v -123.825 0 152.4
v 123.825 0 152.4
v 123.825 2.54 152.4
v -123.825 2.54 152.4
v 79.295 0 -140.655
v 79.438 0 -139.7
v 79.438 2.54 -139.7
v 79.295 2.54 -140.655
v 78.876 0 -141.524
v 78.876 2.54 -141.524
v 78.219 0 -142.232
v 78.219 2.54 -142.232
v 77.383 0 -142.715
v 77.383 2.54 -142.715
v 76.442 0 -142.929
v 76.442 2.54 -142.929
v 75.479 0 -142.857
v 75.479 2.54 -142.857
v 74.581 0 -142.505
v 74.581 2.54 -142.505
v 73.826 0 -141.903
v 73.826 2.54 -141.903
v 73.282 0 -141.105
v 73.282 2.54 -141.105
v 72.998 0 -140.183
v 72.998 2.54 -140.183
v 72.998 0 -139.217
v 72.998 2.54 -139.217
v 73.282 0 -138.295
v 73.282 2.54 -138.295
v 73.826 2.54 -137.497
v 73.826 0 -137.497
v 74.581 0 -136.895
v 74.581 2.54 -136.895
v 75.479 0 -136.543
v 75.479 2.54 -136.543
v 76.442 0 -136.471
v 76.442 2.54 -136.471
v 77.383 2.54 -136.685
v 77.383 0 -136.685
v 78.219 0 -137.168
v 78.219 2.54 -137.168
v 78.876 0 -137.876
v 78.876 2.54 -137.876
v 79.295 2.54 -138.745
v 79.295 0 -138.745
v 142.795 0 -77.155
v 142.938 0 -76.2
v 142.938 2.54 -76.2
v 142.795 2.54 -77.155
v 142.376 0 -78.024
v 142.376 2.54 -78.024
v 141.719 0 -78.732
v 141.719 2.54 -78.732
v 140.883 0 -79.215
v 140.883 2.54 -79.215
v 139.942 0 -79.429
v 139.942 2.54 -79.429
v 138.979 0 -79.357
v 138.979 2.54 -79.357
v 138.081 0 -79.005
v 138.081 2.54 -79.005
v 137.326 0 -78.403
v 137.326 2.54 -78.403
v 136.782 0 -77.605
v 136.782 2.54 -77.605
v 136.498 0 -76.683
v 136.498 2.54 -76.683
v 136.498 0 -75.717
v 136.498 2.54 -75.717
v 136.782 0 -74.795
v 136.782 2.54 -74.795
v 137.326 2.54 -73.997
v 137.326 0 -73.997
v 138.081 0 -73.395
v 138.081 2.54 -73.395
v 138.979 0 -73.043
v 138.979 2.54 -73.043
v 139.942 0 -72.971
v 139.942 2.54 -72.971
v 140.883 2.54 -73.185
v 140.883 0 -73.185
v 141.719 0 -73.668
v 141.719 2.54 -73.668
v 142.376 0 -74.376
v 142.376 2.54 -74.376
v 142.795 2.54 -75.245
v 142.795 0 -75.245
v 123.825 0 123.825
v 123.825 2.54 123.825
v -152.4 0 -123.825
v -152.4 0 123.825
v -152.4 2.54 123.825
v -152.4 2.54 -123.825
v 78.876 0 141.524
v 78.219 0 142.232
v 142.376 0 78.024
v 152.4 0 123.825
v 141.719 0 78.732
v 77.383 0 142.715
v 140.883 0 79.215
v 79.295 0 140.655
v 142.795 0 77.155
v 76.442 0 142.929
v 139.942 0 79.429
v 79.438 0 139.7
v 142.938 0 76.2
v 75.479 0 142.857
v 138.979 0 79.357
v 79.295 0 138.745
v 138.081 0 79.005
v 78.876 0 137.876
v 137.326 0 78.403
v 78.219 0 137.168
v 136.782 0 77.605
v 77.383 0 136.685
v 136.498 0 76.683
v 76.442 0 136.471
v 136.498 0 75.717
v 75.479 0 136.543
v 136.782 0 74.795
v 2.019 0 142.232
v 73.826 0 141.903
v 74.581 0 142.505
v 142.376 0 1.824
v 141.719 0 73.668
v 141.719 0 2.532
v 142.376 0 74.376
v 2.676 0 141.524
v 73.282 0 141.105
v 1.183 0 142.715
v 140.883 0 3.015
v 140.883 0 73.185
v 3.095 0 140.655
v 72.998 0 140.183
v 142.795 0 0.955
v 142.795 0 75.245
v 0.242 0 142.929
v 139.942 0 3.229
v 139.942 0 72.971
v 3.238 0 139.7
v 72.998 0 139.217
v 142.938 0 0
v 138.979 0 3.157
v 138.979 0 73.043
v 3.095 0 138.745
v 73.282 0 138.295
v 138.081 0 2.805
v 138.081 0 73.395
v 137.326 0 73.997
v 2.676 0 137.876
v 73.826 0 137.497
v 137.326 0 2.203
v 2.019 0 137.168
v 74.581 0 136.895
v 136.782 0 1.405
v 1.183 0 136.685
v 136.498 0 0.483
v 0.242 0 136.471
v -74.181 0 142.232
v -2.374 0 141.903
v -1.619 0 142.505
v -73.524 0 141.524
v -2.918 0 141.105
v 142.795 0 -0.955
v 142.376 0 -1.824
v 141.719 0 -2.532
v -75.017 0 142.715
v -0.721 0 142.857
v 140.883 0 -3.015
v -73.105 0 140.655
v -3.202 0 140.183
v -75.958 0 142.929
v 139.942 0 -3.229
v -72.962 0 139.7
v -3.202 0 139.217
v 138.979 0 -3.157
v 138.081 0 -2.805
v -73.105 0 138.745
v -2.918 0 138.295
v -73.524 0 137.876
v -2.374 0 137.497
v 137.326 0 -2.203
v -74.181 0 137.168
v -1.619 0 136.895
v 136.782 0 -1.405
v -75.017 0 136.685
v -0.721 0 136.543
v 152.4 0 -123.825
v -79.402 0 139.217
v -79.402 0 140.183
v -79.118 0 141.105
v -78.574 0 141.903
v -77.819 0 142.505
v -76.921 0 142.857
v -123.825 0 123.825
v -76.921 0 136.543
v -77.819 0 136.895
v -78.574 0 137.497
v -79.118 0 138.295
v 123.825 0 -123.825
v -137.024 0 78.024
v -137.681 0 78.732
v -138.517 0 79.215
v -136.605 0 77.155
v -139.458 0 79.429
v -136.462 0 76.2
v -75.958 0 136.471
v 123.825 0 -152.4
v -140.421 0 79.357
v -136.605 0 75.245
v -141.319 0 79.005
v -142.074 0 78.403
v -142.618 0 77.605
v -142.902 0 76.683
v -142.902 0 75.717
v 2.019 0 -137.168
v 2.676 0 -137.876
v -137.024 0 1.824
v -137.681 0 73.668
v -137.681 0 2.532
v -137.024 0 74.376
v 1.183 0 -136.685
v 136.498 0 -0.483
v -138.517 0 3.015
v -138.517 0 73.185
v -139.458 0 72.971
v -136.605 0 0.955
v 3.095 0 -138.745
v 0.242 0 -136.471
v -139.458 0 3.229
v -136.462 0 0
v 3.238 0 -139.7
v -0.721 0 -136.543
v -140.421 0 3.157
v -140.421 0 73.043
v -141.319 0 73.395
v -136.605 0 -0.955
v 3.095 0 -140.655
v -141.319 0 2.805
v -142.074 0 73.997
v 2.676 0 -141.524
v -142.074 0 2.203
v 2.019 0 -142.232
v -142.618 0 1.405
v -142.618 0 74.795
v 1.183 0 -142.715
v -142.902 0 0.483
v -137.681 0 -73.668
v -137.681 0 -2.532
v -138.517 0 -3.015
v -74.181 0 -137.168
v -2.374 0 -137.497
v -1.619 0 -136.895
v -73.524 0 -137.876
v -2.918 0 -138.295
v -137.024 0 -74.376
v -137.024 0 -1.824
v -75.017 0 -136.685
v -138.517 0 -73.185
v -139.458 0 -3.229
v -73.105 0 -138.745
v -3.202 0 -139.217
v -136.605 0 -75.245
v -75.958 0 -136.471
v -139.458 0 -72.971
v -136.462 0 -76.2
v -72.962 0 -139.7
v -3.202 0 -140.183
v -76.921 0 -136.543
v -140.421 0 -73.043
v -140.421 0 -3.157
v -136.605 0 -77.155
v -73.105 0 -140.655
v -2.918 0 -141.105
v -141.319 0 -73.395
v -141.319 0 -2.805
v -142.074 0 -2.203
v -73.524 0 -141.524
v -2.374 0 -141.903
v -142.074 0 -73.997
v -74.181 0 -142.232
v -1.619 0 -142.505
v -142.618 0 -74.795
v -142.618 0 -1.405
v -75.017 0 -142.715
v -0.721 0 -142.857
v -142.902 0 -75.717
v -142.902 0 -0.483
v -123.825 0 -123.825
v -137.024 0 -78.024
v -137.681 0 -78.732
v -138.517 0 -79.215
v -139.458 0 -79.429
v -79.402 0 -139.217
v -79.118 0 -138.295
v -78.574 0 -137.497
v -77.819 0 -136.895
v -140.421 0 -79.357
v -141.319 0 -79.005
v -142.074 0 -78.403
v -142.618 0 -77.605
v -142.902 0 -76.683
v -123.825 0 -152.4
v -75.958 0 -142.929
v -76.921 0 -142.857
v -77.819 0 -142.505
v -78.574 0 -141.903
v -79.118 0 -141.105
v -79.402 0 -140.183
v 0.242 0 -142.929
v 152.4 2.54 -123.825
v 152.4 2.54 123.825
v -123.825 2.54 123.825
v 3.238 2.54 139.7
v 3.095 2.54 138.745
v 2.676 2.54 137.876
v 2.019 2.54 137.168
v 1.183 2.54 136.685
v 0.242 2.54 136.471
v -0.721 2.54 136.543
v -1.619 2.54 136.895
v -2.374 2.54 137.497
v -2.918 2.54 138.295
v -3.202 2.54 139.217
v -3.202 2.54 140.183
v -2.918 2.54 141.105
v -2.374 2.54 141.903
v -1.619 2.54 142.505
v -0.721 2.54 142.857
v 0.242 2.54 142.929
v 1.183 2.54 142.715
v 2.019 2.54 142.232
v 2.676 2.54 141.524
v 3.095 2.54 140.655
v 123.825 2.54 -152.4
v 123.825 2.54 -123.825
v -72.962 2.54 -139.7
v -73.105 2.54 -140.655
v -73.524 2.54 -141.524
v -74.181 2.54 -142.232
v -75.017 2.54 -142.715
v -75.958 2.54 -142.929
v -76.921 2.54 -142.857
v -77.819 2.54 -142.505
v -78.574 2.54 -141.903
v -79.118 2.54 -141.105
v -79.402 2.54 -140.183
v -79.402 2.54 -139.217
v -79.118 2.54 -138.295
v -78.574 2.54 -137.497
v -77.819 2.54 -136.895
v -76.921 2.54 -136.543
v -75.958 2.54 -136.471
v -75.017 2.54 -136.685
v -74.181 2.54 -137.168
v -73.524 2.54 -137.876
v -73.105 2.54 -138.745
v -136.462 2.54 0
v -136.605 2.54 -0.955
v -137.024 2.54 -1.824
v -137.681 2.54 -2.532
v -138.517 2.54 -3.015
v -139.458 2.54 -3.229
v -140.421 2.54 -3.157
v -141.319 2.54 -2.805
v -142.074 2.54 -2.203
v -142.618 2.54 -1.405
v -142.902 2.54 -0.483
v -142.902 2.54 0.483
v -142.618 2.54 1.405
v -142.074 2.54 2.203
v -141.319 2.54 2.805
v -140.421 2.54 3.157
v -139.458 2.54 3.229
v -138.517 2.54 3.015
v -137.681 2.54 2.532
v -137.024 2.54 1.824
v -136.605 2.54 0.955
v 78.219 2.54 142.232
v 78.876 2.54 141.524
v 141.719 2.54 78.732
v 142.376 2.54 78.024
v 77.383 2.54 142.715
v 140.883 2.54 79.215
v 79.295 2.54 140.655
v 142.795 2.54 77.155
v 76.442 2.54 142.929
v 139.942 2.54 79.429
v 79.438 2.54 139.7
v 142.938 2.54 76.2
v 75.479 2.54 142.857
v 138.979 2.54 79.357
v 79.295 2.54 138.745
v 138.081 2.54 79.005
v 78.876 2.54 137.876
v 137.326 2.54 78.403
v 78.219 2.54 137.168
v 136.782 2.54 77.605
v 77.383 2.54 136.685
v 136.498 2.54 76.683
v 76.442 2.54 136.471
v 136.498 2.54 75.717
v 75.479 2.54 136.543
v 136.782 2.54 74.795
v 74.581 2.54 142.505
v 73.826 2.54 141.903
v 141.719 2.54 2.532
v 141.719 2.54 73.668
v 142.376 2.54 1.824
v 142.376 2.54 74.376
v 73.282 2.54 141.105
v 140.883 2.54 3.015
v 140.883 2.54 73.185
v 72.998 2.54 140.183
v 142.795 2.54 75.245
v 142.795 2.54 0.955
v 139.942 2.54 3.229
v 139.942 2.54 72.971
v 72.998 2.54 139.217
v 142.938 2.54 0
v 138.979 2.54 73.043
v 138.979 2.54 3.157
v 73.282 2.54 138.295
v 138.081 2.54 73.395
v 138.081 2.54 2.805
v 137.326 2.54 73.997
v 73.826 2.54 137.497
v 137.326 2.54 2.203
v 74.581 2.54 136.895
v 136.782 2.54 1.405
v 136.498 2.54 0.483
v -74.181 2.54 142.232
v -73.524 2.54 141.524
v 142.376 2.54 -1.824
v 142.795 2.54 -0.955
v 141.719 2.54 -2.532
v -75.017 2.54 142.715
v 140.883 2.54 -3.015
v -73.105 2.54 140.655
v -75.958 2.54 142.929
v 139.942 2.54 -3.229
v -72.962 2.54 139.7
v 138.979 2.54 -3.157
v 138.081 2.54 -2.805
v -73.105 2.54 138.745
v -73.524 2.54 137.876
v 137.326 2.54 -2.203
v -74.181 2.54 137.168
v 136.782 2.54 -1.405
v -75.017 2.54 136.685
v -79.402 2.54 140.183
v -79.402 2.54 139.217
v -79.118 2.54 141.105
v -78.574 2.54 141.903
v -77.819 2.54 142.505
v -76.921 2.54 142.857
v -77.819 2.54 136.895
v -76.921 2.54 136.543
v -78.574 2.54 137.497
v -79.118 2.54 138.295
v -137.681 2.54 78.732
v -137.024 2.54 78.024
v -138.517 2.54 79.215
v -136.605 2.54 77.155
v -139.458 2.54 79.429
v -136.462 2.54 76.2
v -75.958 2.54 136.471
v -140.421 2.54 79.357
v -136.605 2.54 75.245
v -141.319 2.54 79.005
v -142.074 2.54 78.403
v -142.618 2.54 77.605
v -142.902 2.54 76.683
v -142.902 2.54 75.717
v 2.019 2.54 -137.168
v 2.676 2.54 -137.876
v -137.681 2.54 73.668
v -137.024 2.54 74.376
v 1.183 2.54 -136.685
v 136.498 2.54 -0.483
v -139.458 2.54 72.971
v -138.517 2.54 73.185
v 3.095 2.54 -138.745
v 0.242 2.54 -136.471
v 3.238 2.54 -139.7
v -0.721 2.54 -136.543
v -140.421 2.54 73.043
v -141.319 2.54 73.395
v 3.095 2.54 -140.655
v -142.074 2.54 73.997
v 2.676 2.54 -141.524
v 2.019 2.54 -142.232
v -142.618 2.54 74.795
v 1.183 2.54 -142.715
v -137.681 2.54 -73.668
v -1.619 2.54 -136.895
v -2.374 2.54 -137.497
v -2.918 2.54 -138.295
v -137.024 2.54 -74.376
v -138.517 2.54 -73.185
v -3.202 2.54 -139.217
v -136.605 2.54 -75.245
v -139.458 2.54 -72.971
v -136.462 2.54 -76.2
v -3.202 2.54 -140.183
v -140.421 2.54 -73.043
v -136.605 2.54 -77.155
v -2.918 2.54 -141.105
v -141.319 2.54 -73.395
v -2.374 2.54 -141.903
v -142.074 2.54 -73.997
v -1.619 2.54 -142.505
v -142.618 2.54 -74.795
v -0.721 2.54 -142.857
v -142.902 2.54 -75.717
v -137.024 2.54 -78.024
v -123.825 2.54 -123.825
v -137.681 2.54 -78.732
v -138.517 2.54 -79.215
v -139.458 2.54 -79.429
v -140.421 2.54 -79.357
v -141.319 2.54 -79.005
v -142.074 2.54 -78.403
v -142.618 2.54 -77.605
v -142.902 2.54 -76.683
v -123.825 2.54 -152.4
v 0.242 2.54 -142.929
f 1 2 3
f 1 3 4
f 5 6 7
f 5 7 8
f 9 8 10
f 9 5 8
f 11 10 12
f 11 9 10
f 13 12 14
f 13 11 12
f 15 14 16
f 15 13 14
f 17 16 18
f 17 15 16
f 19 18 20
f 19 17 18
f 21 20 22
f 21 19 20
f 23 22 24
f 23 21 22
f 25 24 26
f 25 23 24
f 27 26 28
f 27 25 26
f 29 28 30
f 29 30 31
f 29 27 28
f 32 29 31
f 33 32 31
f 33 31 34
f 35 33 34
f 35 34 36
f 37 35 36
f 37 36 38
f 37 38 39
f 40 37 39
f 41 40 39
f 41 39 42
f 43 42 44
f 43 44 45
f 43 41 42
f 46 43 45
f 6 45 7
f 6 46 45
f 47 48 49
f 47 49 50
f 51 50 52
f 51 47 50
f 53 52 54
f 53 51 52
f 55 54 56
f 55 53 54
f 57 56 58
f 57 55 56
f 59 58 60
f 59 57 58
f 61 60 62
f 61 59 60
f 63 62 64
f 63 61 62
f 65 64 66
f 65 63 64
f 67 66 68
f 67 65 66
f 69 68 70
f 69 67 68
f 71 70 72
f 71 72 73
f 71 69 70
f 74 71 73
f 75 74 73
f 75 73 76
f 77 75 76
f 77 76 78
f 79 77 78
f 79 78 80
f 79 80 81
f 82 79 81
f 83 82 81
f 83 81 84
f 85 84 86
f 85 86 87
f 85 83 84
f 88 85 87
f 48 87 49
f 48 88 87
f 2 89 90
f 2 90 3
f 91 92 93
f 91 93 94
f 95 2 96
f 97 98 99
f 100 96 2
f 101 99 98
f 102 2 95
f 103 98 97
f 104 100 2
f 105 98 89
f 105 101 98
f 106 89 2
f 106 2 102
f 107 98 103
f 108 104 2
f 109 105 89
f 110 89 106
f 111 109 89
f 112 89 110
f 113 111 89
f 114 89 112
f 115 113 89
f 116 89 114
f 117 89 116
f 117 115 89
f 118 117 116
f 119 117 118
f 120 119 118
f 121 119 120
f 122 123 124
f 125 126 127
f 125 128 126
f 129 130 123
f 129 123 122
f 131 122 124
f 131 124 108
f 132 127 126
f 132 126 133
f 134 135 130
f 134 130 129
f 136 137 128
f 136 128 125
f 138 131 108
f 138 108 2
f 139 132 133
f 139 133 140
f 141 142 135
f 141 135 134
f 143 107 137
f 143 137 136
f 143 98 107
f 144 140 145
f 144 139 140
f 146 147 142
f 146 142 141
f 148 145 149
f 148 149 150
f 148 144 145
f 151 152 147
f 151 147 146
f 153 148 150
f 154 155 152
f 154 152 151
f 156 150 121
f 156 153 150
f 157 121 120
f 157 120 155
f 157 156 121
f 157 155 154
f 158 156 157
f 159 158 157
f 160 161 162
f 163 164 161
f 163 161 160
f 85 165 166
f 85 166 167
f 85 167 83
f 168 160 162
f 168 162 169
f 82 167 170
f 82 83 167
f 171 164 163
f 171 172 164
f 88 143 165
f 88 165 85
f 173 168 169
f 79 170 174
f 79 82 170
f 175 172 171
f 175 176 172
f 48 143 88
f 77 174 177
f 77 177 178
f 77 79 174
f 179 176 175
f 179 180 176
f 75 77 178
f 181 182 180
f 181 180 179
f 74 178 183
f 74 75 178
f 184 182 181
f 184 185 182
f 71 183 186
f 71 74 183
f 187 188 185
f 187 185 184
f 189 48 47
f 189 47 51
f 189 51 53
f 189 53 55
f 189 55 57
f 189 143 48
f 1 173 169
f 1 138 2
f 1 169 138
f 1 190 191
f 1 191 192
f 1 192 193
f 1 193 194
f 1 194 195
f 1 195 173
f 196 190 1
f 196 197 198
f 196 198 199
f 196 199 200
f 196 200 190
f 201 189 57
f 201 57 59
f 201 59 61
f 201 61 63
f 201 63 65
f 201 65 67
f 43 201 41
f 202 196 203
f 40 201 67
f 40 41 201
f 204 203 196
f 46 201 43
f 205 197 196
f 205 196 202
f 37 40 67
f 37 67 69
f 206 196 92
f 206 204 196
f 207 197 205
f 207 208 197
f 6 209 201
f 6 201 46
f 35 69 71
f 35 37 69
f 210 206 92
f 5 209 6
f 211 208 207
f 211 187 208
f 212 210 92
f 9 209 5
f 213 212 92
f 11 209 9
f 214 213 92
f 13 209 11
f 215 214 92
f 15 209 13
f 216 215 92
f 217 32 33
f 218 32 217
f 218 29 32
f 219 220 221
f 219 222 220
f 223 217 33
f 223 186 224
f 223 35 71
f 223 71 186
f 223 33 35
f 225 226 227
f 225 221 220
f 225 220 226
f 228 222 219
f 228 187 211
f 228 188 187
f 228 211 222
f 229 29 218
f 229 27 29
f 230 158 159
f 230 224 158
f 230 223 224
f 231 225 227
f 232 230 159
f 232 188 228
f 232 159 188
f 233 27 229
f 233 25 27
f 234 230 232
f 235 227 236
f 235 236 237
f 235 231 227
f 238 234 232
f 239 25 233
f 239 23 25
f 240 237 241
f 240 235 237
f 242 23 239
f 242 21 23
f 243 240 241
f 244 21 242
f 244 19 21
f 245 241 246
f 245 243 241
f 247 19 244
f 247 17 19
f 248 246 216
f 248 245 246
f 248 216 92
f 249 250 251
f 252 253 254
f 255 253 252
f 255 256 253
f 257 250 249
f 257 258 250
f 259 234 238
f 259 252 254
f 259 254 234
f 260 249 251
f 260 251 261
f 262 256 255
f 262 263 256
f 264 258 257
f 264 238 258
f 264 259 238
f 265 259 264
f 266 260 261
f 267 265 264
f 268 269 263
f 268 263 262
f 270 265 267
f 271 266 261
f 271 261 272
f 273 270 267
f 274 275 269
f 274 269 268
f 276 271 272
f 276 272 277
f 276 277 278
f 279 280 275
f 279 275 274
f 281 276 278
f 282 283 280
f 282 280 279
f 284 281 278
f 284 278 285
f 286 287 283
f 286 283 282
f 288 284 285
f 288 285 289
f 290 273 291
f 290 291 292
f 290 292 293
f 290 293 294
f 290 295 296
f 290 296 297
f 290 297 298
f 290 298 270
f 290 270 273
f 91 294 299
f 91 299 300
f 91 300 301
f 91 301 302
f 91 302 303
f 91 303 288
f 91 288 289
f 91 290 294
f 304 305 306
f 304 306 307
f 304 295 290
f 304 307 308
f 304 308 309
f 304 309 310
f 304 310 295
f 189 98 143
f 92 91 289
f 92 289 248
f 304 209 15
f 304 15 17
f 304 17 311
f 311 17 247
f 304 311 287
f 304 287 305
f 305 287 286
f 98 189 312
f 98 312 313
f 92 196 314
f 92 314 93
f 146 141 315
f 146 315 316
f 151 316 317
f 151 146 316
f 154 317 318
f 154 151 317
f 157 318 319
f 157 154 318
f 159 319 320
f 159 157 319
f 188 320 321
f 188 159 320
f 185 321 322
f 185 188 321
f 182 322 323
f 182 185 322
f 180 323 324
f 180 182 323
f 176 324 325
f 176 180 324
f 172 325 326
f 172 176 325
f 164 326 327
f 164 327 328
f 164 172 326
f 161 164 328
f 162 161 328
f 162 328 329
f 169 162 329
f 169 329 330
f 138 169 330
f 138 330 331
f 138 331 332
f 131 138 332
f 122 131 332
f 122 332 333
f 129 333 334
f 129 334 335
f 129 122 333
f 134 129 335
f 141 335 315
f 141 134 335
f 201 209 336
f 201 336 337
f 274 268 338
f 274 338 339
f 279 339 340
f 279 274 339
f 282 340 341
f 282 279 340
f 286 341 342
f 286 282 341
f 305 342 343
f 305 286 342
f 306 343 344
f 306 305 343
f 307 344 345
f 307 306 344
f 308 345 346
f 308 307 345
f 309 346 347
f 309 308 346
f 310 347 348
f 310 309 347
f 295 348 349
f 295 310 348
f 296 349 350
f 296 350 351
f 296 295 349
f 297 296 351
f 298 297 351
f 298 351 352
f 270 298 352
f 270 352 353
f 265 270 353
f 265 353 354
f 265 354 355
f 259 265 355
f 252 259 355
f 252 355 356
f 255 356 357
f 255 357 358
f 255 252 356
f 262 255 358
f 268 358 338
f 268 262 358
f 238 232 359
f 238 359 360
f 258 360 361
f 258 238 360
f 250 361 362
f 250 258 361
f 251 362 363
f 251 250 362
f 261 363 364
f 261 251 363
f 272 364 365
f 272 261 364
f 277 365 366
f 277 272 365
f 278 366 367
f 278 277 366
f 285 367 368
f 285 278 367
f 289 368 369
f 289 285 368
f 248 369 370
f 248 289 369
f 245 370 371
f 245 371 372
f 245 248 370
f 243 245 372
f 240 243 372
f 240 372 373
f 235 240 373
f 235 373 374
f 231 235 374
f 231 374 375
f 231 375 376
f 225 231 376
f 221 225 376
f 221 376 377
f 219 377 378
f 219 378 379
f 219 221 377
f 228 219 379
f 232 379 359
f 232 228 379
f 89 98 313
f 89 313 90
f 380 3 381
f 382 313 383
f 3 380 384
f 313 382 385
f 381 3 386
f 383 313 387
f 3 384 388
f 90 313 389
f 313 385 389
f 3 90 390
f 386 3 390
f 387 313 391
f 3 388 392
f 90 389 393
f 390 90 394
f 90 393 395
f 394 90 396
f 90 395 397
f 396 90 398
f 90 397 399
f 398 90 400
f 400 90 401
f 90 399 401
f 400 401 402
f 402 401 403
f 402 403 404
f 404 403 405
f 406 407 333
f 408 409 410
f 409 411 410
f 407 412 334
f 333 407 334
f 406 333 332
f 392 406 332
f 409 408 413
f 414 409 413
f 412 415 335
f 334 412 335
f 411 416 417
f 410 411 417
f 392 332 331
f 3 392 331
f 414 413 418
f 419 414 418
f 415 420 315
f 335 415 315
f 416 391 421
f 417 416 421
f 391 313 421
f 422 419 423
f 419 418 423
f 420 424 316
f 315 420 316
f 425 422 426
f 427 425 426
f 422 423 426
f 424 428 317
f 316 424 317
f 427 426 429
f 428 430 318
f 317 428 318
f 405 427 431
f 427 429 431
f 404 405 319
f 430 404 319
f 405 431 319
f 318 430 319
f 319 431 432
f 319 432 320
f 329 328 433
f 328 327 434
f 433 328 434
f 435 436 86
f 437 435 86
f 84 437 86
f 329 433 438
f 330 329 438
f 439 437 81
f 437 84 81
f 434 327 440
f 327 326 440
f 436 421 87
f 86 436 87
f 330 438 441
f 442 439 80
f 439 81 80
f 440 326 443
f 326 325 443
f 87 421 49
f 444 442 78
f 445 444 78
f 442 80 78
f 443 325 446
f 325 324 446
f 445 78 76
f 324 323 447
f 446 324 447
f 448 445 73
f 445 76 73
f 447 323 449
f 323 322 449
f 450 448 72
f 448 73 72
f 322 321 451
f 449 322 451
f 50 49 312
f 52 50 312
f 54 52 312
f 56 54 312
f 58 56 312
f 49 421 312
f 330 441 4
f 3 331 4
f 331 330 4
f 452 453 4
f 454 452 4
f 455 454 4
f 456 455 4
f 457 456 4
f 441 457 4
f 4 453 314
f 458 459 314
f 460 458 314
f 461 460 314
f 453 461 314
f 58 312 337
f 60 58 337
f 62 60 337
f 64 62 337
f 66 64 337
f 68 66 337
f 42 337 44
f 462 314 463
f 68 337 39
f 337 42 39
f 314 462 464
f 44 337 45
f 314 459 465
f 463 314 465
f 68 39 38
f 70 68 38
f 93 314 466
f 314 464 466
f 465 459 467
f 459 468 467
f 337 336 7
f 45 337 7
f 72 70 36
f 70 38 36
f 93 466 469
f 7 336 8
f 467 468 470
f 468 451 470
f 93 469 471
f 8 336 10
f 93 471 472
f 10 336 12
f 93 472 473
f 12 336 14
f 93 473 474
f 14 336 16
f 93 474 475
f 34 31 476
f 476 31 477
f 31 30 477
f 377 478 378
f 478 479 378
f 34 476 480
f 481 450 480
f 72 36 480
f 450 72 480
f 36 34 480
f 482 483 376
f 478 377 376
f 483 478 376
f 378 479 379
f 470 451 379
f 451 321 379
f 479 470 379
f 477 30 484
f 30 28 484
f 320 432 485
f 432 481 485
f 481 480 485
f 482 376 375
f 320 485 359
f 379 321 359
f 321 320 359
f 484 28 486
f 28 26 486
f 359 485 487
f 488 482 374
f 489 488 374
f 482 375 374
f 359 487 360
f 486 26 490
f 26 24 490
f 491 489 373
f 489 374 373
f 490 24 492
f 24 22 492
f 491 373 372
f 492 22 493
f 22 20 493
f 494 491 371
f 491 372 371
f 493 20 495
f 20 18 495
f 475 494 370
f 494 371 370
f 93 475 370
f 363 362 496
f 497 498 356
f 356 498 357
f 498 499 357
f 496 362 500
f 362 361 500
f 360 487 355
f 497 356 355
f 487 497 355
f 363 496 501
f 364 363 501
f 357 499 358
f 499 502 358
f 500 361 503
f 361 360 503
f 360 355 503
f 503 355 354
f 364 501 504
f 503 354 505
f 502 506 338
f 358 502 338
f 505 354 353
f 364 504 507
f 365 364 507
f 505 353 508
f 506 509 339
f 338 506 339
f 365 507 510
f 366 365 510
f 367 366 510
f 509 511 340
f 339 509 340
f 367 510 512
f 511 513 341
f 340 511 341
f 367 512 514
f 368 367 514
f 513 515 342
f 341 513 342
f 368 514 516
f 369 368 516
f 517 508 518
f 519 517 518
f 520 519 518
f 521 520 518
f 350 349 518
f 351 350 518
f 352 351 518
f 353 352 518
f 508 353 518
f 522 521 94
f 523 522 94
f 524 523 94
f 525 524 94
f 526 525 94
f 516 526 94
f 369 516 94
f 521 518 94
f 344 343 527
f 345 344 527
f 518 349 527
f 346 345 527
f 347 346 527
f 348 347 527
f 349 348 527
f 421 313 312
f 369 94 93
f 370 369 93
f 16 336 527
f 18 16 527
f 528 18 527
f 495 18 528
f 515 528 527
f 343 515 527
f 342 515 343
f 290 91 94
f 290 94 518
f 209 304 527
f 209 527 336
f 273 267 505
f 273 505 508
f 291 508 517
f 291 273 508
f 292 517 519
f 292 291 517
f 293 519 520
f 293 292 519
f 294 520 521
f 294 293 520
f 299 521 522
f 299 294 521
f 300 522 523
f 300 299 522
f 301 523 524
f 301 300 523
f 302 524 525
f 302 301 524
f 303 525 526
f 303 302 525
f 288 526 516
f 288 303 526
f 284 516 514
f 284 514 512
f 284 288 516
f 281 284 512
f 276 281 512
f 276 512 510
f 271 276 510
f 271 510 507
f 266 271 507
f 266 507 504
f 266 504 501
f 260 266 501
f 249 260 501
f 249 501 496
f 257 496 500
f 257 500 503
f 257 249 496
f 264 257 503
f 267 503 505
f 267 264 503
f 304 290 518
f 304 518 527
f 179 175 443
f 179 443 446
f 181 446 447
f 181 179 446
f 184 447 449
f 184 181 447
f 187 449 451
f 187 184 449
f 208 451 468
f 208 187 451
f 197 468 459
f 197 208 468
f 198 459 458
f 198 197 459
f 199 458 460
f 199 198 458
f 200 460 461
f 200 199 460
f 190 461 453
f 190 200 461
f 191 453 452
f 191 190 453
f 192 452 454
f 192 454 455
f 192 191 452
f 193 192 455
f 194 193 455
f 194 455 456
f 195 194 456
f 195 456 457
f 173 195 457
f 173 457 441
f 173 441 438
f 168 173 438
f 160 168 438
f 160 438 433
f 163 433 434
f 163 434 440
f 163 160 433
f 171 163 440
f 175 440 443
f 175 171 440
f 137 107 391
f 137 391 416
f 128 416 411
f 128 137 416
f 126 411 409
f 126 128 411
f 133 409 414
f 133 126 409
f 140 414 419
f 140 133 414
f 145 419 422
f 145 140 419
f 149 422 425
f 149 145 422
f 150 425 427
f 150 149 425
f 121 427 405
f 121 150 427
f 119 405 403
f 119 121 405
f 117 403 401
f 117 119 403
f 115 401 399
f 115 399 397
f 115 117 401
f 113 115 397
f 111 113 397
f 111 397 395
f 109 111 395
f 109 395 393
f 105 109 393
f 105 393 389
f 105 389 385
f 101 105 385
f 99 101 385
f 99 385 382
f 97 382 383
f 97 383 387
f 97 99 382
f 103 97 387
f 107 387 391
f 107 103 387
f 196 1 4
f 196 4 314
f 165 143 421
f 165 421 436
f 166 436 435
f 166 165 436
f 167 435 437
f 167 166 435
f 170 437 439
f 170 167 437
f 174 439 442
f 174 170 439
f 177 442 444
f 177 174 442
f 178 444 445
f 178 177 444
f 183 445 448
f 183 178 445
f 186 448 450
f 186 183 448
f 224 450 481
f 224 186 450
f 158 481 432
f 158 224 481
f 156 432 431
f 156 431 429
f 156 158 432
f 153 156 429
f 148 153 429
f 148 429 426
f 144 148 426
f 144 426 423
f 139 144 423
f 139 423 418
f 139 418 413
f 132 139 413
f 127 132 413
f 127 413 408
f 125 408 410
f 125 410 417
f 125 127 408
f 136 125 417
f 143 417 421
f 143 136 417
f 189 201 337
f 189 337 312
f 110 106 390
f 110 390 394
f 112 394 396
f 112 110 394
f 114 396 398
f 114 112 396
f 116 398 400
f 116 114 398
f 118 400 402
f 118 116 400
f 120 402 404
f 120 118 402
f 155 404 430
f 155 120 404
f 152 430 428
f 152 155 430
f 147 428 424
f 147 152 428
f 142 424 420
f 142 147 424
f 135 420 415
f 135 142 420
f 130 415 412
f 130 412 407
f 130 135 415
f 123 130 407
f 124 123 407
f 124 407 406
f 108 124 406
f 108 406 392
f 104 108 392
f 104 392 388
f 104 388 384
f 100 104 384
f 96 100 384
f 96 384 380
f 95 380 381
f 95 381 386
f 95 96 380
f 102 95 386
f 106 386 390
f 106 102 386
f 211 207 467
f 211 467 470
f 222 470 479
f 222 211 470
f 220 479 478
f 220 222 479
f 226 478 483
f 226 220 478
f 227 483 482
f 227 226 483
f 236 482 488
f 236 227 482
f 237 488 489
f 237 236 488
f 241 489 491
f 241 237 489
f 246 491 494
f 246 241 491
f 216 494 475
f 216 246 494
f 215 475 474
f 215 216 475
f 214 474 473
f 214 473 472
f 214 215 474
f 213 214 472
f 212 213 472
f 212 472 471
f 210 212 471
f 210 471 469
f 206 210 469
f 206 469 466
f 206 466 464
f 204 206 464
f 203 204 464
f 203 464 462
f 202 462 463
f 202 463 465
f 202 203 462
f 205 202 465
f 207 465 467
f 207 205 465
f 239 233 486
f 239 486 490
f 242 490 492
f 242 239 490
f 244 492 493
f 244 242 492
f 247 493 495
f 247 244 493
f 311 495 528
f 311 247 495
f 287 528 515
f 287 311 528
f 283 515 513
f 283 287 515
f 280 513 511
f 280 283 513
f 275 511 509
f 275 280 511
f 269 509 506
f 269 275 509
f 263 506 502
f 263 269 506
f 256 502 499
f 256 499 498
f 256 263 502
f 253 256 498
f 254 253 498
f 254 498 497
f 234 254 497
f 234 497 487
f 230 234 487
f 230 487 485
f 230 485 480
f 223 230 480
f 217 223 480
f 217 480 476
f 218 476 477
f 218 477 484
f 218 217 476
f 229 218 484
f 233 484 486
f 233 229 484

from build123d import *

# Parameters (mm, degrees)
SKETCH1_R           = 3.2385
BOSS_EXTRUDE1_DEPTH = 2.54


with BuildPart() as part:
    # Sketch1 → Boss-Extrude1 (new body)
    with BuildSketch(Plane(origin=(0, 0, 0), x_dir=(1, 0, 0), z_dir=(0, 1, 0))):
        Polygon((123.825, 152.4), (123.825, 123.825), (152.4, 123.825), (152.4, -123.825), (123.825, -123.825), (123.825, -152.4), (-123.825, -152.4), (-123.825, -123.825), (-152.4, -123.825), (-152.4, 123.825), (-123.825, 123.825), (-123.825, 152.4), align=None)
        with Locations((76.2, 139.7)):
            Circle(SKETCH1_R, mode=Mode.SUBTRACT)
        with Locations((0, 139.7)):
            Circle(SKETCH1_R, mode=Mode.SUBTRACT)
        with Locations((-76.2, 139.7)):
            Circle(SKETCH1_R, mode=Mode.SUBTRACT)
        with Locations((-76.2, -139.7)):
            Circle(SKETCH1_R, mode=Mode.SUBTRACT)
        with Locations((0, -139.7)):
            Circle(SKETCH1_R, mode=Mode.SUBTRACT)
        with Locations((76.2, -139.7)):
            Circle(SKETCH1_R, mode=Mode.SUBTRACT)
        with Locations((139.7, -76.2)):
            Circle(SKETCH1_R, mode=Mode.SUBTRACT)
        with Locations((139.7, 0)):
            Circle(SKETCH1_R, mode=Mode.SUBTRACT)
        with Locations((139.7, 76.2)):
            Circle(SKETCH1_R, mode=Mode.SUBTRACT)
        with Locations((-139.7, 76.2)):
            Circle(SKETCH1_R, mode=Mode.SUBTRACT)
        with Locations((-139.7, 0)):
            Circle(SKETCH1_R, mode=Mode.SUBTRACT)
        with Locations((-139.7, -76.2)):
            Circle(SKETCH1_R, mode=Mode.SUBTRACT)
    extrude(amount=BOSS_EXTRUDE1_DEPTH)


solid = part.part
